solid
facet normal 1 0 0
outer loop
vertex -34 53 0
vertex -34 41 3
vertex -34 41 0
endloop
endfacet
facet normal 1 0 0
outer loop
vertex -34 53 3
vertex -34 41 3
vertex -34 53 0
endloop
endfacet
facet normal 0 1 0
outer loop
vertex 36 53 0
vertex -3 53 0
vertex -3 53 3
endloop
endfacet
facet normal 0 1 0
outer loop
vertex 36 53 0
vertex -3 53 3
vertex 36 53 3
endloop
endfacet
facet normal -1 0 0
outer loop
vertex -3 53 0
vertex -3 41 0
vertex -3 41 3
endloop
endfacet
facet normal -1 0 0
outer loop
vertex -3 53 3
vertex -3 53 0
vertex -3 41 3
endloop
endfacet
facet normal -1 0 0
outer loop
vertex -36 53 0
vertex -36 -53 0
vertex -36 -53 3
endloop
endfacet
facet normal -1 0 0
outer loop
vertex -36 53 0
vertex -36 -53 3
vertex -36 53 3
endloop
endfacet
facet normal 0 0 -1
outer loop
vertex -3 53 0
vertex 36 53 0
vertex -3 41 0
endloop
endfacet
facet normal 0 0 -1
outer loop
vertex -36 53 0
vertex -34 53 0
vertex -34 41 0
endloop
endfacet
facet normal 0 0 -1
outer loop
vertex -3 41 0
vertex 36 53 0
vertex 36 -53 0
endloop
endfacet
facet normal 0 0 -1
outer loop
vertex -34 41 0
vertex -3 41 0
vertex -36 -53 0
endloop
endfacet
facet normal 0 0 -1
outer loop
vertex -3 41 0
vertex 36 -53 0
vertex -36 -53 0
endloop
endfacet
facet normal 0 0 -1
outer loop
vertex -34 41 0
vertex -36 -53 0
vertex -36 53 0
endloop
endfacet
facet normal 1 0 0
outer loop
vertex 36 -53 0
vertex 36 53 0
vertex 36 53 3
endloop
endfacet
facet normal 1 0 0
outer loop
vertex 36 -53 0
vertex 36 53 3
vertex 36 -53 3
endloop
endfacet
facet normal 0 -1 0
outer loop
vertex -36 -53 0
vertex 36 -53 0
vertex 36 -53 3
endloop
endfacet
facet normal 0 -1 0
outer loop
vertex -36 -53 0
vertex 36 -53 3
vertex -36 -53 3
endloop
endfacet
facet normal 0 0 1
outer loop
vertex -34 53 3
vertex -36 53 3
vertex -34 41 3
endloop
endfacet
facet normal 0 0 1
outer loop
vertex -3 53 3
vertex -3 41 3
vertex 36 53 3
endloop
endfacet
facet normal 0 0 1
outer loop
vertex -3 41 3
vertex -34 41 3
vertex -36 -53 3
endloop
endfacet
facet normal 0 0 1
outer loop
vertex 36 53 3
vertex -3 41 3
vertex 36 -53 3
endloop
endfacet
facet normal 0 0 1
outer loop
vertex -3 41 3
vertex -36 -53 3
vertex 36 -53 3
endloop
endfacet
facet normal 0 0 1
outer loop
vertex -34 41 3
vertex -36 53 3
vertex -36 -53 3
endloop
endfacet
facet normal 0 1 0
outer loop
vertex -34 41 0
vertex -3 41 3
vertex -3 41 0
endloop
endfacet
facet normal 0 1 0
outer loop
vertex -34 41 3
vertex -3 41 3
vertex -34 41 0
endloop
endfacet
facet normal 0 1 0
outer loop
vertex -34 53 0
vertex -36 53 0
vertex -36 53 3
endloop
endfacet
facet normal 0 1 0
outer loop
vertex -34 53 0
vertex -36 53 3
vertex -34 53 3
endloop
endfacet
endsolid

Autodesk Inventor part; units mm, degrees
ref_plane "YZ Plane" through (0, 0, 0) normal (1, 0, 0) x (0, 1, 0)
ref_plane "XZ Plane" through (0, 0, 0) normal (0, 1, 0) x (-1, 0, 0)
ref_plane "XY Plane" through (0, 0, 0) normal (0, 0, 1) x (1, 0, 0)
sketch "Sketch1" plane through (0, 0, 0) normal (0, 0, 1) x (1, 0, 0)
  line L0 (-36, 53) -> (36, 53)
  line L1 (36, 53) -> (36, -53)
  line L2 (36, -53) -> (-36, -53)
  line L3 (-36, -53) -> (-36, 53)
  line L4 (-36, 53) -> (36, -53) construction
  line L5 (36, 53) -> (-36, -53) construction
  point P0 (0, 0)
  dimension "d0" = 72
  dimension "d1" = 106
extrude "Extrusion1" add sketch "Sketch1" along normal blind 3
sketch "Sketch2" plane through (0, 0, 3) normal (0, 0, 1) x (1, 0, 0)
  line L0 (-34, 53) -> (4, 53)
  line L1 (4, 53) -> (4, 41)
  line L2 (4, 41) -> (-34, 41)
  line L3 (-34, 41) -> (-34, 53)
  line L4 (36, 53) -> (-36, 53) projected
  line L5 (-36, 53) -> (-36, -53) projected
  point P0 (0, 0)
  dimension "d4" = 0
  dimension "d5" = 2
  dimension "d6" = 12
  dimension "d7" = 38
extrude "Extrusion2" cut sketch "Sketch2" against normal blind 3
sketch "Sketch3" plane through (4, 41, 3) normal (-1, 0, 0) x (0, 0, 1)
  point P0 (-3, -41)
sketch "Sketch7" plane through (-34, 41, 3) normal (0, 1, 0) x (1, 0, 0)
  line L0 (38, 3) -> (38, 0) projected
  line L1 (38, 3) -> (31, 3)
  line L2 (31, 3) -> (31, 0)
  line L3 (31, 0) -> (38, 0)
  line L4 (38, 0) -> (38, 3)
  point P0 (34, 3)
  dimension "d18" = 7
  dimension "d19" = 3
extrude "Extrusion5" add sketch "Sketch7" along normal blind 12
properties part number "Lid"
